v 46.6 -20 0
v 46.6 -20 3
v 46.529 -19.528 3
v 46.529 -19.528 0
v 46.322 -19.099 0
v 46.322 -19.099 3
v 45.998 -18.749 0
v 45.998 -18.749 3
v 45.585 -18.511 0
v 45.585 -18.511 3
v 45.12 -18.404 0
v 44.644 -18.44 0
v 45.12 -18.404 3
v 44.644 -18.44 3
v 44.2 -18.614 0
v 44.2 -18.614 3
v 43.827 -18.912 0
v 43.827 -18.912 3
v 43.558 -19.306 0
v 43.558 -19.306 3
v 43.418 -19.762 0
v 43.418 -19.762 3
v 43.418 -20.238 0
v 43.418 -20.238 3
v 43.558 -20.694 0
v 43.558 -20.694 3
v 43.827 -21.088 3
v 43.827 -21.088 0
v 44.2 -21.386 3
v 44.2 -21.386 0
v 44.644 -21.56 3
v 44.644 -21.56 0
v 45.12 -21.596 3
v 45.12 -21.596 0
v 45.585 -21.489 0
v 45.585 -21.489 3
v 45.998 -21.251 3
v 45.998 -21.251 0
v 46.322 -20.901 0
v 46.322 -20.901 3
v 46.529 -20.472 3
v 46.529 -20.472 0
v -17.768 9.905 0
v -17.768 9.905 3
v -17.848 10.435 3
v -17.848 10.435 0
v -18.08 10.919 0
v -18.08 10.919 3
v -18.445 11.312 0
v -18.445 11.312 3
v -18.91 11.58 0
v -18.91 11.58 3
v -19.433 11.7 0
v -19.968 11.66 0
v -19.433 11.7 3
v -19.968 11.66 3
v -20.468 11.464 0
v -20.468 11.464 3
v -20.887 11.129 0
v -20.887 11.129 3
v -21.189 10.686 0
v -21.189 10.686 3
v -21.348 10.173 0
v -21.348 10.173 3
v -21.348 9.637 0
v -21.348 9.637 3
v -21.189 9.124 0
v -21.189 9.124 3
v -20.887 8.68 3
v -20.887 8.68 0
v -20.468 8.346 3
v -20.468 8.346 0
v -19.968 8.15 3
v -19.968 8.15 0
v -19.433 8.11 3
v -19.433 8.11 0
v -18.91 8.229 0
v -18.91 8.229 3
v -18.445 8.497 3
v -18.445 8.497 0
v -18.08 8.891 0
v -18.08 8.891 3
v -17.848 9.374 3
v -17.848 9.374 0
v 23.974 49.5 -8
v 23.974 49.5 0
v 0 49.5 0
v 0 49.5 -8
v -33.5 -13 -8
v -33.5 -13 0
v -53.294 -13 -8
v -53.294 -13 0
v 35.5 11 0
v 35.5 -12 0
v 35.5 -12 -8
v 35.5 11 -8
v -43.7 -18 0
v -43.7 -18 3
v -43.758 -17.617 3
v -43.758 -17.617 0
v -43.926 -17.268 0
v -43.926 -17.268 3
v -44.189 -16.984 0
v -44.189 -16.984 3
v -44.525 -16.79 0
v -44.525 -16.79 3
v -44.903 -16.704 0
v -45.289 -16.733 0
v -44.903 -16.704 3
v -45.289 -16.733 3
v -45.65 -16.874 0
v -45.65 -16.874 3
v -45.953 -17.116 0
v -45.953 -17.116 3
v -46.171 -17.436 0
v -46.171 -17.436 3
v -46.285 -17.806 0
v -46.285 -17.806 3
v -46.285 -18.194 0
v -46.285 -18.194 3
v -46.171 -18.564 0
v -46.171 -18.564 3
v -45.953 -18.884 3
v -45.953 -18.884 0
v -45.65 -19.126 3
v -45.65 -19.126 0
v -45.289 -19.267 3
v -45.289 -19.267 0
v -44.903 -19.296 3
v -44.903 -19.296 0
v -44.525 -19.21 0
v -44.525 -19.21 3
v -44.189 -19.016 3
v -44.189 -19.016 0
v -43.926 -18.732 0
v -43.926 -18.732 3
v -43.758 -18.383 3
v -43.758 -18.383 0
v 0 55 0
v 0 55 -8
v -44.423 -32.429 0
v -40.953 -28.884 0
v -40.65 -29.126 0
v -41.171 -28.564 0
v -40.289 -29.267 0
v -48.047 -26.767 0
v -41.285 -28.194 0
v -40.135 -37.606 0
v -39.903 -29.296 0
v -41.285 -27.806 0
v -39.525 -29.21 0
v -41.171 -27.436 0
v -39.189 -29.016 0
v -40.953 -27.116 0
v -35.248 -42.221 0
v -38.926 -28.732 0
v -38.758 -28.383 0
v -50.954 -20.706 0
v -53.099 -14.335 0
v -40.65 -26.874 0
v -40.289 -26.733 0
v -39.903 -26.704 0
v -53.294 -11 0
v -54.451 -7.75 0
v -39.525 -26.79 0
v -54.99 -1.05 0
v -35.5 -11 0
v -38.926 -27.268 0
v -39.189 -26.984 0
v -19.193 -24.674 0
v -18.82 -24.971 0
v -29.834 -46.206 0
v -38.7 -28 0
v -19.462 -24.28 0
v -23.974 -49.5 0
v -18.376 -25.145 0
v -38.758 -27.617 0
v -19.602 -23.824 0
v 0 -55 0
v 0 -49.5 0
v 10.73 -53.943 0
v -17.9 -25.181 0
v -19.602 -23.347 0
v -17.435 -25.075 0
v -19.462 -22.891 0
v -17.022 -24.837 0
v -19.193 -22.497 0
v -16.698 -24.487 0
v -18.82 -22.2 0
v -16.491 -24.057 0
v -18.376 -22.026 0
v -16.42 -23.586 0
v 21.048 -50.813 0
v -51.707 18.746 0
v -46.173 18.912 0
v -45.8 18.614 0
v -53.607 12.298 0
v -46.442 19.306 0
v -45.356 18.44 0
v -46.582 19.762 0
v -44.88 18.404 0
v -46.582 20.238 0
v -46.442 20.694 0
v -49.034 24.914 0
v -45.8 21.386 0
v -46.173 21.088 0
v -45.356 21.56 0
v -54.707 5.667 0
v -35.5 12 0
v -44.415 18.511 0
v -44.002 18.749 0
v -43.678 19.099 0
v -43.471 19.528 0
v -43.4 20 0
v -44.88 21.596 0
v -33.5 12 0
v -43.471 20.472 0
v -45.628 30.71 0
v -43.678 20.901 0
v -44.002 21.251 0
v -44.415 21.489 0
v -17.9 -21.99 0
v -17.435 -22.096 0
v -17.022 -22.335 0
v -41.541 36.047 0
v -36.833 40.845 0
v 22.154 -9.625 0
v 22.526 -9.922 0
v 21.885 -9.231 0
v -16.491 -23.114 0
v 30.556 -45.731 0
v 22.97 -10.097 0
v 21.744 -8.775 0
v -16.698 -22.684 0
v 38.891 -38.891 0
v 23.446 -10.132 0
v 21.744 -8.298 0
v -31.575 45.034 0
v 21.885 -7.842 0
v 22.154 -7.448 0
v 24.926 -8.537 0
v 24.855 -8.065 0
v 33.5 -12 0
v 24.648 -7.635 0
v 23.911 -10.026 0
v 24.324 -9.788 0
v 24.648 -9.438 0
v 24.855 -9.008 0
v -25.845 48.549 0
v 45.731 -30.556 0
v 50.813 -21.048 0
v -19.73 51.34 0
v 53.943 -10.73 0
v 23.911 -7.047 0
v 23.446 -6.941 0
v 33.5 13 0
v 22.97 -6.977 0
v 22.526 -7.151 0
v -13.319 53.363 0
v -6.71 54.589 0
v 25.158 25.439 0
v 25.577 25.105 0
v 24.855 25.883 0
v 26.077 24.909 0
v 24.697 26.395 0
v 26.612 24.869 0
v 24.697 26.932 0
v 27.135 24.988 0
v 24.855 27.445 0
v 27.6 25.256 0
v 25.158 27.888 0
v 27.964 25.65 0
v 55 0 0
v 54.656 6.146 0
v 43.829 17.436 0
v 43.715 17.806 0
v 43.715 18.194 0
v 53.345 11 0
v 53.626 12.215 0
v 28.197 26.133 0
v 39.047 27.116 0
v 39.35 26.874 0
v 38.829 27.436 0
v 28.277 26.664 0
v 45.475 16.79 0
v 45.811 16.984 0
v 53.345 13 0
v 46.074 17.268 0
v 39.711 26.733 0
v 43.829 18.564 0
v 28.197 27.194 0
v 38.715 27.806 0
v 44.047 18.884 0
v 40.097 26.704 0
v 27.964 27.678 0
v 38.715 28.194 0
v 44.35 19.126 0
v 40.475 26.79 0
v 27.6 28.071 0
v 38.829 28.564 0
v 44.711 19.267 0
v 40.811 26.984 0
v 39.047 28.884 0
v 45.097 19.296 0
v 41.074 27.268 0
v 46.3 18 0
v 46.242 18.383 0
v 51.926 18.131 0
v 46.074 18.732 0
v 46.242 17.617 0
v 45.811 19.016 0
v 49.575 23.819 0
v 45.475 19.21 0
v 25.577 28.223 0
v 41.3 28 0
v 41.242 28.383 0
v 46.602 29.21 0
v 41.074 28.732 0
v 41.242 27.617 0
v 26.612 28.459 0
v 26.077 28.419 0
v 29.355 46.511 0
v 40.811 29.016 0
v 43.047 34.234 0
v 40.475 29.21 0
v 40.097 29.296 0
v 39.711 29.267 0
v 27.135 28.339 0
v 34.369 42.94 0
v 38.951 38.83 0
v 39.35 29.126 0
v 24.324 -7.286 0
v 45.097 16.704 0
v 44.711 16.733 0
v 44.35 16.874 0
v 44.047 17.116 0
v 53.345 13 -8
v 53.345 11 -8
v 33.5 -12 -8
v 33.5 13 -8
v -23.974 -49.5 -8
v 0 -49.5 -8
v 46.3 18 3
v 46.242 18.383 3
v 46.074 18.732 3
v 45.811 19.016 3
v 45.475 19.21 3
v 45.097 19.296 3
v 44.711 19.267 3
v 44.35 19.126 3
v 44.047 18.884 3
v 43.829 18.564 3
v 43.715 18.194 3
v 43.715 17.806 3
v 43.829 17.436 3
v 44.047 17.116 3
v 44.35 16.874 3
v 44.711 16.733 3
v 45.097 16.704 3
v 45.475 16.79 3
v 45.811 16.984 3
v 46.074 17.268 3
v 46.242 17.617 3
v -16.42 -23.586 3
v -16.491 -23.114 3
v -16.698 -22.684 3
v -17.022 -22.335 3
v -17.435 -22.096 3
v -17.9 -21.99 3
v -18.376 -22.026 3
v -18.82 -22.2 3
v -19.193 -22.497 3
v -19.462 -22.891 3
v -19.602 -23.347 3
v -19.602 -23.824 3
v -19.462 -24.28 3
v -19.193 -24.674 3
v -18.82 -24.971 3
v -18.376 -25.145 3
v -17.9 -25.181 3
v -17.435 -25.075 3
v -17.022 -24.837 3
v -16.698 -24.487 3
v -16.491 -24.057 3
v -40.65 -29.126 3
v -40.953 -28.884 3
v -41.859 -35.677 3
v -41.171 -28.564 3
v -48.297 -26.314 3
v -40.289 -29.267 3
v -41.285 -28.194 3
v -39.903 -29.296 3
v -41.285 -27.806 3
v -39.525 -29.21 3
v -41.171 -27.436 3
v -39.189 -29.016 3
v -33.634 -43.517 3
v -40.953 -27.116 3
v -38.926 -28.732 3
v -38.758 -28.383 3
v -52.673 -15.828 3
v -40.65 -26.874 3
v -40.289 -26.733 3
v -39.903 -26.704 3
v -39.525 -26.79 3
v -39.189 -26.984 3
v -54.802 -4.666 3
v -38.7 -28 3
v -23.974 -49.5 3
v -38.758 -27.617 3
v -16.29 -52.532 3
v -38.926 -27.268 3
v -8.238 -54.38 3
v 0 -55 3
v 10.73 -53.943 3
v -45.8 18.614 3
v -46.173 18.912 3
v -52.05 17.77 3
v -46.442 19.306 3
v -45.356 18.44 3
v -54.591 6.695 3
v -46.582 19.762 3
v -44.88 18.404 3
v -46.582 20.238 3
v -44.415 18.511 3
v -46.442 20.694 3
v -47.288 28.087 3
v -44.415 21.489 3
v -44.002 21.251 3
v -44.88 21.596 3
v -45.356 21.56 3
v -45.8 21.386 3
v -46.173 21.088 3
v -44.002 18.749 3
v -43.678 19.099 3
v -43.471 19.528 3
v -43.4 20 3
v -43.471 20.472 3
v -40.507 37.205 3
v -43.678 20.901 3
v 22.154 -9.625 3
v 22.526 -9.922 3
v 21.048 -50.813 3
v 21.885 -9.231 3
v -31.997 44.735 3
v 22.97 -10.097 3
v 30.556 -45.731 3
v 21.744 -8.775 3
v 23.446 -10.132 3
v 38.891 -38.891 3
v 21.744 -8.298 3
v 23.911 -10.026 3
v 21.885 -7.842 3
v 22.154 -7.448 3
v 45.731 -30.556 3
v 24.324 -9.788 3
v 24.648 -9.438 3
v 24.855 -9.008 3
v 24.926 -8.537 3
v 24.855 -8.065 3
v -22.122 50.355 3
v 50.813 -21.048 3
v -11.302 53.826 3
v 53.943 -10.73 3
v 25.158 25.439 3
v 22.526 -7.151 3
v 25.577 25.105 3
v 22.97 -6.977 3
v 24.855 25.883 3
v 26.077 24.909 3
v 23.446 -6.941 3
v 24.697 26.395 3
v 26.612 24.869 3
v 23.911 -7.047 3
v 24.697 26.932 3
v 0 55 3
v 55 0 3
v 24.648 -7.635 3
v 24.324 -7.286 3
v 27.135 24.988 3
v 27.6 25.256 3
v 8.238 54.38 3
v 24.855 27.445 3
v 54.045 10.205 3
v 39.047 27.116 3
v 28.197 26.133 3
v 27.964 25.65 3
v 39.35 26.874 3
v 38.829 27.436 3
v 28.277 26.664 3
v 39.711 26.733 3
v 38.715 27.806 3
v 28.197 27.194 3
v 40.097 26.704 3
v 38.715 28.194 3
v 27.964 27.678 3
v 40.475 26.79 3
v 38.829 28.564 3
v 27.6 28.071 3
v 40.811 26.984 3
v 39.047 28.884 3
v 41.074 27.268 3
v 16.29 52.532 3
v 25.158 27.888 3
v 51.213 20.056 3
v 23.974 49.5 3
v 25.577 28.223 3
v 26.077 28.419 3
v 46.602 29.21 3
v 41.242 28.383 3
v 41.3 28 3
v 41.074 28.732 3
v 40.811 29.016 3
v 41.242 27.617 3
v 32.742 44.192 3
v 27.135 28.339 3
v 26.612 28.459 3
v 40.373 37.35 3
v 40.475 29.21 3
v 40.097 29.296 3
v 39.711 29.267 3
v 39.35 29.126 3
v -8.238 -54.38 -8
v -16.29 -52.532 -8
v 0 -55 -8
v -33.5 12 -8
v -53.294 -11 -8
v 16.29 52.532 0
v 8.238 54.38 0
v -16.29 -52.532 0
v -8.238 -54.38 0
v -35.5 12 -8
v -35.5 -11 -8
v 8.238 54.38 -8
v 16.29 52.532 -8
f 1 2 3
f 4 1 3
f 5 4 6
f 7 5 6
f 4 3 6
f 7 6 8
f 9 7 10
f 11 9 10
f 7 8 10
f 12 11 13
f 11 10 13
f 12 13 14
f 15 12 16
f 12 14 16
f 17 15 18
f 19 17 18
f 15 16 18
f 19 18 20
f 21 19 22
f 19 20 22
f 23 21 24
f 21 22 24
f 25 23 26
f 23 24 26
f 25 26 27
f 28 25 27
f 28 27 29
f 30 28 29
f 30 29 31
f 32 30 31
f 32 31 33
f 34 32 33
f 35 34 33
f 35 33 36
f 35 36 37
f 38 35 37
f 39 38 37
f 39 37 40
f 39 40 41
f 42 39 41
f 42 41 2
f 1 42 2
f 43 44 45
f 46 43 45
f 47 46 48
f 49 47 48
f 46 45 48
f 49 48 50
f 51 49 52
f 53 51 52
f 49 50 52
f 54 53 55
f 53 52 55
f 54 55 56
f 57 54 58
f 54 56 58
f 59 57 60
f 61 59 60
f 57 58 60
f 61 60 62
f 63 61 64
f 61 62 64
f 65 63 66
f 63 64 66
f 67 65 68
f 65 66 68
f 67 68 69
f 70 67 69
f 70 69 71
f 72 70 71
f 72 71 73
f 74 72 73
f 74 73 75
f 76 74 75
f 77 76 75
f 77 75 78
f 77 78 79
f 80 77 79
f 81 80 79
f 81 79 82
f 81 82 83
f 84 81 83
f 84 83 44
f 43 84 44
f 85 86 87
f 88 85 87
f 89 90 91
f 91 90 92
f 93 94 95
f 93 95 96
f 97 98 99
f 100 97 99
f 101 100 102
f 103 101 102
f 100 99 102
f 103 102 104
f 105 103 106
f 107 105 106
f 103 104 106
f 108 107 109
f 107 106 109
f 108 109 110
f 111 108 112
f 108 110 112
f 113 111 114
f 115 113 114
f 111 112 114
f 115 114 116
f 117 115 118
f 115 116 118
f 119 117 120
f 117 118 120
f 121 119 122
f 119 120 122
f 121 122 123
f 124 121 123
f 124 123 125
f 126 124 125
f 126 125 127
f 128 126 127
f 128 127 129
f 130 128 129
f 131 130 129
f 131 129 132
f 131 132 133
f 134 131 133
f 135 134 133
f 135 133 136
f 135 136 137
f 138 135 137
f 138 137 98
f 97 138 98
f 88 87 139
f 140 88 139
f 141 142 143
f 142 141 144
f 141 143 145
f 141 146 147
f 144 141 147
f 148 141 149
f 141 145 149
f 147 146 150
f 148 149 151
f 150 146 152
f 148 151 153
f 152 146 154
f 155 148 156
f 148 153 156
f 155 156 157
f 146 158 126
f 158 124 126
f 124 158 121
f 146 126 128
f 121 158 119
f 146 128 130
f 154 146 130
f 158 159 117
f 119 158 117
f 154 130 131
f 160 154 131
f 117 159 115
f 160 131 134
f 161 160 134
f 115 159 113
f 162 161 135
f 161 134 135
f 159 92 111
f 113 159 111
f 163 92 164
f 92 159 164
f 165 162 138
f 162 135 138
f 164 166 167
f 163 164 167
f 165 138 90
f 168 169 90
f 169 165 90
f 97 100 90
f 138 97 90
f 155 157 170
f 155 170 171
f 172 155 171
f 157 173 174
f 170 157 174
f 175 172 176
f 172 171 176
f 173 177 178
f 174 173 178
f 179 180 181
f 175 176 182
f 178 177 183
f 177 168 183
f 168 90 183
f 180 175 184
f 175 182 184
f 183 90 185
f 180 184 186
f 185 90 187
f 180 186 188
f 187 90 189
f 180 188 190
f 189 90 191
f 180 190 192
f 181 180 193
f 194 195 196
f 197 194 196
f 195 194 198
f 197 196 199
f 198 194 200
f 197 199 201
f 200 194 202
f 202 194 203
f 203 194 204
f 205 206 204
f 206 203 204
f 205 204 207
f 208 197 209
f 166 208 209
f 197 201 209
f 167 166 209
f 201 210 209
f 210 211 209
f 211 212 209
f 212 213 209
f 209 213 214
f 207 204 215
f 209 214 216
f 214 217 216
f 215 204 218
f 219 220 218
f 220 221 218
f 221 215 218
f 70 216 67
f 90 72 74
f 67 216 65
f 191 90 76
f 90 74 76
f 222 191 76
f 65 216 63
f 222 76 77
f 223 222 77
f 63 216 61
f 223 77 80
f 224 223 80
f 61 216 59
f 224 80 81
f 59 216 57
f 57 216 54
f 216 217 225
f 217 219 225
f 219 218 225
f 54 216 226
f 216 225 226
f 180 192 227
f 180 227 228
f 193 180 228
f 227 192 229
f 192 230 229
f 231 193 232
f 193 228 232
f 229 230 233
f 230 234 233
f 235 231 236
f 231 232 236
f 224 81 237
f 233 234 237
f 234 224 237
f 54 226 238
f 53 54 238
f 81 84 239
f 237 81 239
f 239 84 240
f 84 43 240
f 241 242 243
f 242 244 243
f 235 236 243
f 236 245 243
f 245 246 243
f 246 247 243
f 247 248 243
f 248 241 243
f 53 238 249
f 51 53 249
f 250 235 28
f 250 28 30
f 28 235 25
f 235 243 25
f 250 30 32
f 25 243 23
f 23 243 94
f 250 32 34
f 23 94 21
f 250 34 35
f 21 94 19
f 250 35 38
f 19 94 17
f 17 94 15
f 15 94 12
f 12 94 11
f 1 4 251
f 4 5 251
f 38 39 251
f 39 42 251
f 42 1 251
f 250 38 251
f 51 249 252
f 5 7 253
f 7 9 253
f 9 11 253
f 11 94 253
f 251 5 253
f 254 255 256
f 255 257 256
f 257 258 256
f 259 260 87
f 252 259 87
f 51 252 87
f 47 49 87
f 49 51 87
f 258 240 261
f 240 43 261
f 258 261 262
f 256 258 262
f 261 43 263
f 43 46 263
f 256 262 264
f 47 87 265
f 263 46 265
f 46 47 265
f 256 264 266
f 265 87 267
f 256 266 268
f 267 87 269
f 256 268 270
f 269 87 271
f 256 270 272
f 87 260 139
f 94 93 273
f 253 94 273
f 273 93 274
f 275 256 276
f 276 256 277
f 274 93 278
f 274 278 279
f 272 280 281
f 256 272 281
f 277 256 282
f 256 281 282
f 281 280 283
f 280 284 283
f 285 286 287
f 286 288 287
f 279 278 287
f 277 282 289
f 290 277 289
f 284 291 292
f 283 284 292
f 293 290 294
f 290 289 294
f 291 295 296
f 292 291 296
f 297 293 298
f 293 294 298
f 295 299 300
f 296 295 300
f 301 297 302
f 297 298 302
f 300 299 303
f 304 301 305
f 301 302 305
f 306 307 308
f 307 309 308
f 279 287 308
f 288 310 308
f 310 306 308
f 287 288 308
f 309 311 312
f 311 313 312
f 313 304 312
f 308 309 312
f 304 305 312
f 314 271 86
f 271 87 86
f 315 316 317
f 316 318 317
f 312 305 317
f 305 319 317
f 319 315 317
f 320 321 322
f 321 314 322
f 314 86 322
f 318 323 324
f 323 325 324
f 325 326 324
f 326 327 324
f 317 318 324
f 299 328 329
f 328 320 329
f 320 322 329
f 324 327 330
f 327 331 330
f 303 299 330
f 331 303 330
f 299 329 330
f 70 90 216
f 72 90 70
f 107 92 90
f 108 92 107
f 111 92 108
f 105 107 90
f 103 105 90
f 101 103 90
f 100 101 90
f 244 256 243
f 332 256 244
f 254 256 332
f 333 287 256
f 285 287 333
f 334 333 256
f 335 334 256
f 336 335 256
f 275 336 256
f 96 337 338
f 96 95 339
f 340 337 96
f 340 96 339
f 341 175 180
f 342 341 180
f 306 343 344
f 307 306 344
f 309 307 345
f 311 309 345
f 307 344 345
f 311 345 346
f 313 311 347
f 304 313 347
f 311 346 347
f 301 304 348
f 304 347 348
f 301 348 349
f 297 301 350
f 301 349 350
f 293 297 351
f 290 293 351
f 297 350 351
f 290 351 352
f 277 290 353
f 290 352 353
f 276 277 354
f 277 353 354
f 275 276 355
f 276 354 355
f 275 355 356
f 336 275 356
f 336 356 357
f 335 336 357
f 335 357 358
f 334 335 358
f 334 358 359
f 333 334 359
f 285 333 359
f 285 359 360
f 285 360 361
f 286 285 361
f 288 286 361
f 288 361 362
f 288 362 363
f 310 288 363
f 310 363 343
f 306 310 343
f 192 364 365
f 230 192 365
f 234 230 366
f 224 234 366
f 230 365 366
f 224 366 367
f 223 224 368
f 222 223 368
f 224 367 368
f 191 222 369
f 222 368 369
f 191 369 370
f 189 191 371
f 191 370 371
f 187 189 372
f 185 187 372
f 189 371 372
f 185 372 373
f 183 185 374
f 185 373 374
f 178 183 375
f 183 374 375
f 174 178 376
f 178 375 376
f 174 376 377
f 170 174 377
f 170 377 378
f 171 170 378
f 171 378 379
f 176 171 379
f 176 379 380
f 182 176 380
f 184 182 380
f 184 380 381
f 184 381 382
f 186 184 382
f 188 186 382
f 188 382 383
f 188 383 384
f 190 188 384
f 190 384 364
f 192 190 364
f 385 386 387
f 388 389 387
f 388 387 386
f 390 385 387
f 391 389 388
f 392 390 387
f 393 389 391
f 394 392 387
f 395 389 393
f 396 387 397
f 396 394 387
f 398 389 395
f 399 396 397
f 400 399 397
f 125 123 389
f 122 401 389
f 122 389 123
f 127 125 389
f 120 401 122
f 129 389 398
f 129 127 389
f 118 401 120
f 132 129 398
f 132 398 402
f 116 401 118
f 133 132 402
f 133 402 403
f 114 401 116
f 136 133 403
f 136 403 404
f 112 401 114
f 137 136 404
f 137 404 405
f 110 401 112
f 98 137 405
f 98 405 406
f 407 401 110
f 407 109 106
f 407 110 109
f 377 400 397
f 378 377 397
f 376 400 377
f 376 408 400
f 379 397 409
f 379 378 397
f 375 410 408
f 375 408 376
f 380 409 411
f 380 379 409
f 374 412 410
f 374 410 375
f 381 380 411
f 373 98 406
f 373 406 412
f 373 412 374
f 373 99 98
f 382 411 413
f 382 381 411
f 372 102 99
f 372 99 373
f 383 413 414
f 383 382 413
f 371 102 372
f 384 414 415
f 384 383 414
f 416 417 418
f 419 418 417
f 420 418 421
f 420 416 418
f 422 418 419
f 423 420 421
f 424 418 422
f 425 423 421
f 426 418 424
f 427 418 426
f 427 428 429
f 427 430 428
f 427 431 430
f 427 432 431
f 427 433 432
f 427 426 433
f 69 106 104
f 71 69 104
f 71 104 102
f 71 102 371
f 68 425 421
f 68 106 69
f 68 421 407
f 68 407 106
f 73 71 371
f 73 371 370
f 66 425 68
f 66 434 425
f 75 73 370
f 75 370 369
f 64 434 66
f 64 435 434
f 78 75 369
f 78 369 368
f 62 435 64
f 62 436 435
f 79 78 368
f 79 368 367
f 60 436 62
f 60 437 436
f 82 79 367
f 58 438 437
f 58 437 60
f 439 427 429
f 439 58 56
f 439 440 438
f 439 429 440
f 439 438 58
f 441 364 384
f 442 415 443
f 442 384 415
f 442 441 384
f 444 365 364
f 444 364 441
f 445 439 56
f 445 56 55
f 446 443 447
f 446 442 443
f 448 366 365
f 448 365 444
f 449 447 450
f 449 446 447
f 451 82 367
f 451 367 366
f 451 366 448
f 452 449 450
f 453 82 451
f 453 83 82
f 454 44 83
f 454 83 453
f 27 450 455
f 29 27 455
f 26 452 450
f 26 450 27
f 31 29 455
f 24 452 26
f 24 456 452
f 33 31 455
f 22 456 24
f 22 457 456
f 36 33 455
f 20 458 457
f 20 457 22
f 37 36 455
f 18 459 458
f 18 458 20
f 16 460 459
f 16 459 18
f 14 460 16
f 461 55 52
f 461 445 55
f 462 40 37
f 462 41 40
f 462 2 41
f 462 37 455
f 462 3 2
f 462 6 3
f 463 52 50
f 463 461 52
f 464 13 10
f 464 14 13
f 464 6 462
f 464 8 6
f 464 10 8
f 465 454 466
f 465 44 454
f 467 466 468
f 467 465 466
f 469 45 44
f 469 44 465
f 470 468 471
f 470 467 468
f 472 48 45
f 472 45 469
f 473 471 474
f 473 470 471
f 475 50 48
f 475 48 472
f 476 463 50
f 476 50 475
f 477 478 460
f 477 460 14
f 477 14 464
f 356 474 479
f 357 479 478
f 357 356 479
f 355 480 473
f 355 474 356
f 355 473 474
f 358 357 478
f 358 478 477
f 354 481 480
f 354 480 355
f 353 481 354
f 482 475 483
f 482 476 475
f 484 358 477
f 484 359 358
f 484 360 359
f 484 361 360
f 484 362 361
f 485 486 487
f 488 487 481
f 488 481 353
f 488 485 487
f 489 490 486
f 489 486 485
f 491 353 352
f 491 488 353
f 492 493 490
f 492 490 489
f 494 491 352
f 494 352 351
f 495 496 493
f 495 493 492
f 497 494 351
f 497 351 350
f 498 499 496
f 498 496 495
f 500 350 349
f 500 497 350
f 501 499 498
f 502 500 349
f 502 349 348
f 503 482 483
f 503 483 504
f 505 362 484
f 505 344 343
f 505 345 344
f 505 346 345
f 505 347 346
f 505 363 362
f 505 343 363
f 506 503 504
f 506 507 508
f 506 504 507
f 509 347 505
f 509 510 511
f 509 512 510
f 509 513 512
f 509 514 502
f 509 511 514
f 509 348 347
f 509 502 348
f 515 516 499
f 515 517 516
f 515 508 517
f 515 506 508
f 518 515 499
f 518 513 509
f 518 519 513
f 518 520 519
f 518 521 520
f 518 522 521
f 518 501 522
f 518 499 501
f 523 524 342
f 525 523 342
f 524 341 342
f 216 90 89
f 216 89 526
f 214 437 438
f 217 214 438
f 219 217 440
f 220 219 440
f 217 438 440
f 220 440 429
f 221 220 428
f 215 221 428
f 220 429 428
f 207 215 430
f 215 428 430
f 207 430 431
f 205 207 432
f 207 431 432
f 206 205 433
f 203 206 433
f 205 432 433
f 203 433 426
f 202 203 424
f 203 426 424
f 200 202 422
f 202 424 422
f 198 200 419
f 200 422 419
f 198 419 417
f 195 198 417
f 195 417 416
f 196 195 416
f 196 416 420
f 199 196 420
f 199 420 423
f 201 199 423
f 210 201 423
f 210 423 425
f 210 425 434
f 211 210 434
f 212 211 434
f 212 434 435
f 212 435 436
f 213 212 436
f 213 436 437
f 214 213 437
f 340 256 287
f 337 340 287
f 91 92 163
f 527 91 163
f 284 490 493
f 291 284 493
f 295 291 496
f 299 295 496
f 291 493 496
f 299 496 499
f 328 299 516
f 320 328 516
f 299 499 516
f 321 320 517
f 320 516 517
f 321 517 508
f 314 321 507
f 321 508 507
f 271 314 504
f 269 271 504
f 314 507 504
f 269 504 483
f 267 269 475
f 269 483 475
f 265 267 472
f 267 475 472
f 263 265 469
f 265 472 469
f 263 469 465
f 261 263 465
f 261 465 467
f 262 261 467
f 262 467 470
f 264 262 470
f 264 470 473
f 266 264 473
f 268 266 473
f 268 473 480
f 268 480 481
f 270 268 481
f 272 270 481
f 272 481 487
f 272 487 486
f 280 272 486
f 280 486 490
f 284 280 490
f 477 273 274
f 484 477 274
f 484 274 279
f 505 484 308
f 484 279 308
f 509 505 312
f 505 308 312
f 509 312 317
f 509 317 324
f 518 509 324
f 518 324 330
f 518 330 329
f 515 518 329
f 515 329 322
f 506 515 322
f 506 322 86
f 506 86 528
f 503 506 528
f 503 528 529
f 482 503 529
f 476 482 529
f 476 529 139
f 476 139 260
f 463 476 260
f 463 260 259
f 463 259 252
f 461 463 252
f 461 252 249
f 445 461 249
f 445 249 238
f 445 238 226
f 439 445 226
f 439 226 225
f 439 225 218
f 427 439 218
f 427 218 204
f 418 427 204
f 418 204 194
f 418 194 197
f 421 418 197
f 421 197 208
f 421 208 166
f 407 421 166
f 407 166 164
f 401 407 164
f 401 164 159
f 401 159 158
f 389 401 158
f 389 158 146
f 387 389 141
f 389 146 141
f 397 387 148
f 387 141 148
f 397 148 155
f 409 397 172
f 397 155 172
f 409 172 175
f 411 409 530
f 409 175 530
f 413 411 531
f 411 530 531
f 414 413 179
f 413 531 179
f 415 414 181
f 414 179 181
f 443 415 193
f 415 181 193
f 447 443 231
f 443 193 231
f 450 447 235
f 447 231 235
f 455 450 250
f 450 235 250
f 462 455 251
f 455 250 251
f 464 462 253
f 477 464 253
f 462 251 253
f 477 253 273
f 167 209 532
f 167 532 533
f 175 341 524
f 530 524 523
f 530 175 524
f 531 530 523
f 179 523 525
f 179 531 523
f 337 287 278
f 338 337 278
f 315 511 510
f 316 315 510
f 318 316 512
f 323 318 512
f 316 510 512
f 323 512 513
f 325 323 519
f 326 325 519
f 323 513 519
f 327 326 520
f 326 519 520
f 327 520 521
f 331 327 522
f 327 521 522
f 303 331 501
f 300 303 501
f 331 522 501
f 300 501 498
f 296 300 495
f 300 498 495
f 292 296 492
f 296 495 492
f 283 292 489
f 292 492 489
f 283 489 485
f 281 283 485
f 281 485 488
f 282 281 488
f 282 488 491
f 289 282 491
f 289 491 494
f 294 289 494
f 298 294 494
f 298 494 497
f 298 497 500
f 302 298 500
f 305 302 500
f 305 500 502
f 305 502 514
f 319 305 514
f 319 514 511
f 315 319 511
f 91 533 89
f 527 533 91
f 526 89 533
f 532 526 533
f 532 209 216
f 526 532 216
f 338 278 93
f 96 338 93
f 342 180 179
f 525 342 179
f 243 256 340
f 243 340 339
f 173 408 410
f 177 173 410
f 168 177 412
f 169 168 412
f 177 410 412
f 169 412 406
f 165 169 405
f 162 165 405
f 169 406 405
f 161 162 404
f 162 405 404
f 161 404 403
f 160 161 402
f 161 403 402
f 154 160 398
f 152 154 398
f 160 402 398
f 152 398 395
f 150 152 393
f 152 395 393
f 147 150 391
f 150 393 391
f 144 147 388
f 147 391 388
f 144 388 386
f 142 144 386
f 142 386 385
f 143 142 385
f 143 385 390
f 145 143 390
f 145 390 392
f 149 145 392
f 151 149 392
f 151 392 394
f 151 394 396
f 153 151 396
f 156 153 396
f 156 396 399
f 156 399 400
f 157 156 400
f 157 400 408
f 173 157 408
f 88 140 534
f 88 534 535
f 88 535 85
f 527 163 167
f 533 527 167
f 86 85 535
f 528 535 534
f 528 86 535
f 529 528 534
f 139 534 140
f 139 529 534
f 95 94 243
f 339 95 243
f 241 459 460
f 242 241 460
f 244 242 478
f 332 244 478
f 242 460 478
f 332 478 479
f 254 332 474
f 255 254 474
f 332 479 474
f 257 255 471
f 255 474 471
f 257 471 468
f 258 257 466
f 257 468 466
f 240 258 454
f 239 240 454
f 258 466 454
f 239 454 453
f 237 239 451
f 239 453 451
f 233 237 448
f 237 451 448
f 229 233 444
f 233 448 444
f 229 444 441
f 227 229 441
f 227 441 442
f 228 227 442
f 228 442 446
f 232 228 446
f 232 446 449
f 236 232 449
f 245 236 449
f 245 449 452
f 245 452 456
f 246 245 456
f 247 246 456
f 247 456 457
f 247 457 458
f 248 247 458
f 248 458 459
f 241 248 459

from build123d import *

# Parameters (mm, degrees)
SKETCH_R        = 55
PAD_DEPTH       = 3
SKETCH003_R     = 1.3
SKETCH003_R_2   = 1.8
SKETCH003_R_3   = 1.6
POCKET_DEPTH    = 5
PAD001_DEPTH    = 11
PAD002_DEPTH    = 11
SKETCH004_R     = 1.6
POCKET001_DEPTH = 5


with BuildPart() as part:
    # Sketch → Pad (new body)
    with BuildSketch(Plane.XY):
        Circle(SKETCH_R)
    extrude(amount=PAD_DEPTH)

    # Sketch003 → Pocket (cut)
    with BuildSketch(Plane.XY.offset(3)):
        with Locations((-45, -18)):
            Circle(SKETCH003_R)
        with Locations((45, 18)):
            Circle(SKETCH003_R)
        with Locations((-40, -28)):
            Circle(SKETCH003_R)
        with Locations((40, 28)):
            Circle(SKETCH003_R)
        with Locations((-19.567712, 9.90478)):
            Circle(SKETCH003_R_2)
        with Locations((26.477227, 26.663767)):
            Circle(SKETCH003_R_2)
        with Locations((-18.019993, -23.585586)):
            Circle(SKETCH003_R_3)
        with Locations((23.326482, -8.536699)):
            Circle(SKETCH003_R_3)
    extrude(amount=-POCKET_DEPTH, mode=Mode.SUBTRACT)

    # Sketch001 (on Face3 of Pad) → Pad001 (join)
    with BuildSketch(Plane.XY.offset(3)):
        Polygon((33.500008, 0), (33.500008, 13), (53.345406, 13), (53.345406, 11), (35.5, 11), (35.5, -0.005684), (35.5, -12), (33.500008, -12), align=None)
        Polygon((-33.5, 0), (-33.5, -13), (-53.293575, -13), (-53.293575, -11), (-35.5, -11), (-35.5, 0.001212), (-35.5, 12), (-33.5, 12), align=None)
    extrude(amount=-PAD001_DEPTH)

    # Sketch002 → Pad002 (join)
    with BuildSketch(Plane.XY.offset(3)):
        with BuildLine():
            ThreePointArc((-23.973944, -49.5), (-12.298374, -53.607369), (0, -55))
            Line((0, -49.5), (0, -55))
            Line((-23.973944, -49.5), (0, -49.5))
        make_face()
        with BuildLine():
            ThreePointArc((23.973944, 49.5), (12.298374, 53.607369), (0, 55))
            Line((0, 49.5), (0, 55))
            Line((23.973944, 49.5), (0, 49.5))
        make_face()
    extrude(amount=-PAD002_DEPTH)

    # Sketch004 (on Face4 of Pad002) → Pocket001 (cut)
    with BuildSketch(Plane.XY.offset(3)):
        with Locations((-45, 20)):
            Circle(SKETCH004_R)
        with Locations((45, -20)):
            Circle(SKETCH004_R)
    extrude(amount=-POCKET001_DEPTH, mode=Mode.SUBTRACT)


solid = part.part
